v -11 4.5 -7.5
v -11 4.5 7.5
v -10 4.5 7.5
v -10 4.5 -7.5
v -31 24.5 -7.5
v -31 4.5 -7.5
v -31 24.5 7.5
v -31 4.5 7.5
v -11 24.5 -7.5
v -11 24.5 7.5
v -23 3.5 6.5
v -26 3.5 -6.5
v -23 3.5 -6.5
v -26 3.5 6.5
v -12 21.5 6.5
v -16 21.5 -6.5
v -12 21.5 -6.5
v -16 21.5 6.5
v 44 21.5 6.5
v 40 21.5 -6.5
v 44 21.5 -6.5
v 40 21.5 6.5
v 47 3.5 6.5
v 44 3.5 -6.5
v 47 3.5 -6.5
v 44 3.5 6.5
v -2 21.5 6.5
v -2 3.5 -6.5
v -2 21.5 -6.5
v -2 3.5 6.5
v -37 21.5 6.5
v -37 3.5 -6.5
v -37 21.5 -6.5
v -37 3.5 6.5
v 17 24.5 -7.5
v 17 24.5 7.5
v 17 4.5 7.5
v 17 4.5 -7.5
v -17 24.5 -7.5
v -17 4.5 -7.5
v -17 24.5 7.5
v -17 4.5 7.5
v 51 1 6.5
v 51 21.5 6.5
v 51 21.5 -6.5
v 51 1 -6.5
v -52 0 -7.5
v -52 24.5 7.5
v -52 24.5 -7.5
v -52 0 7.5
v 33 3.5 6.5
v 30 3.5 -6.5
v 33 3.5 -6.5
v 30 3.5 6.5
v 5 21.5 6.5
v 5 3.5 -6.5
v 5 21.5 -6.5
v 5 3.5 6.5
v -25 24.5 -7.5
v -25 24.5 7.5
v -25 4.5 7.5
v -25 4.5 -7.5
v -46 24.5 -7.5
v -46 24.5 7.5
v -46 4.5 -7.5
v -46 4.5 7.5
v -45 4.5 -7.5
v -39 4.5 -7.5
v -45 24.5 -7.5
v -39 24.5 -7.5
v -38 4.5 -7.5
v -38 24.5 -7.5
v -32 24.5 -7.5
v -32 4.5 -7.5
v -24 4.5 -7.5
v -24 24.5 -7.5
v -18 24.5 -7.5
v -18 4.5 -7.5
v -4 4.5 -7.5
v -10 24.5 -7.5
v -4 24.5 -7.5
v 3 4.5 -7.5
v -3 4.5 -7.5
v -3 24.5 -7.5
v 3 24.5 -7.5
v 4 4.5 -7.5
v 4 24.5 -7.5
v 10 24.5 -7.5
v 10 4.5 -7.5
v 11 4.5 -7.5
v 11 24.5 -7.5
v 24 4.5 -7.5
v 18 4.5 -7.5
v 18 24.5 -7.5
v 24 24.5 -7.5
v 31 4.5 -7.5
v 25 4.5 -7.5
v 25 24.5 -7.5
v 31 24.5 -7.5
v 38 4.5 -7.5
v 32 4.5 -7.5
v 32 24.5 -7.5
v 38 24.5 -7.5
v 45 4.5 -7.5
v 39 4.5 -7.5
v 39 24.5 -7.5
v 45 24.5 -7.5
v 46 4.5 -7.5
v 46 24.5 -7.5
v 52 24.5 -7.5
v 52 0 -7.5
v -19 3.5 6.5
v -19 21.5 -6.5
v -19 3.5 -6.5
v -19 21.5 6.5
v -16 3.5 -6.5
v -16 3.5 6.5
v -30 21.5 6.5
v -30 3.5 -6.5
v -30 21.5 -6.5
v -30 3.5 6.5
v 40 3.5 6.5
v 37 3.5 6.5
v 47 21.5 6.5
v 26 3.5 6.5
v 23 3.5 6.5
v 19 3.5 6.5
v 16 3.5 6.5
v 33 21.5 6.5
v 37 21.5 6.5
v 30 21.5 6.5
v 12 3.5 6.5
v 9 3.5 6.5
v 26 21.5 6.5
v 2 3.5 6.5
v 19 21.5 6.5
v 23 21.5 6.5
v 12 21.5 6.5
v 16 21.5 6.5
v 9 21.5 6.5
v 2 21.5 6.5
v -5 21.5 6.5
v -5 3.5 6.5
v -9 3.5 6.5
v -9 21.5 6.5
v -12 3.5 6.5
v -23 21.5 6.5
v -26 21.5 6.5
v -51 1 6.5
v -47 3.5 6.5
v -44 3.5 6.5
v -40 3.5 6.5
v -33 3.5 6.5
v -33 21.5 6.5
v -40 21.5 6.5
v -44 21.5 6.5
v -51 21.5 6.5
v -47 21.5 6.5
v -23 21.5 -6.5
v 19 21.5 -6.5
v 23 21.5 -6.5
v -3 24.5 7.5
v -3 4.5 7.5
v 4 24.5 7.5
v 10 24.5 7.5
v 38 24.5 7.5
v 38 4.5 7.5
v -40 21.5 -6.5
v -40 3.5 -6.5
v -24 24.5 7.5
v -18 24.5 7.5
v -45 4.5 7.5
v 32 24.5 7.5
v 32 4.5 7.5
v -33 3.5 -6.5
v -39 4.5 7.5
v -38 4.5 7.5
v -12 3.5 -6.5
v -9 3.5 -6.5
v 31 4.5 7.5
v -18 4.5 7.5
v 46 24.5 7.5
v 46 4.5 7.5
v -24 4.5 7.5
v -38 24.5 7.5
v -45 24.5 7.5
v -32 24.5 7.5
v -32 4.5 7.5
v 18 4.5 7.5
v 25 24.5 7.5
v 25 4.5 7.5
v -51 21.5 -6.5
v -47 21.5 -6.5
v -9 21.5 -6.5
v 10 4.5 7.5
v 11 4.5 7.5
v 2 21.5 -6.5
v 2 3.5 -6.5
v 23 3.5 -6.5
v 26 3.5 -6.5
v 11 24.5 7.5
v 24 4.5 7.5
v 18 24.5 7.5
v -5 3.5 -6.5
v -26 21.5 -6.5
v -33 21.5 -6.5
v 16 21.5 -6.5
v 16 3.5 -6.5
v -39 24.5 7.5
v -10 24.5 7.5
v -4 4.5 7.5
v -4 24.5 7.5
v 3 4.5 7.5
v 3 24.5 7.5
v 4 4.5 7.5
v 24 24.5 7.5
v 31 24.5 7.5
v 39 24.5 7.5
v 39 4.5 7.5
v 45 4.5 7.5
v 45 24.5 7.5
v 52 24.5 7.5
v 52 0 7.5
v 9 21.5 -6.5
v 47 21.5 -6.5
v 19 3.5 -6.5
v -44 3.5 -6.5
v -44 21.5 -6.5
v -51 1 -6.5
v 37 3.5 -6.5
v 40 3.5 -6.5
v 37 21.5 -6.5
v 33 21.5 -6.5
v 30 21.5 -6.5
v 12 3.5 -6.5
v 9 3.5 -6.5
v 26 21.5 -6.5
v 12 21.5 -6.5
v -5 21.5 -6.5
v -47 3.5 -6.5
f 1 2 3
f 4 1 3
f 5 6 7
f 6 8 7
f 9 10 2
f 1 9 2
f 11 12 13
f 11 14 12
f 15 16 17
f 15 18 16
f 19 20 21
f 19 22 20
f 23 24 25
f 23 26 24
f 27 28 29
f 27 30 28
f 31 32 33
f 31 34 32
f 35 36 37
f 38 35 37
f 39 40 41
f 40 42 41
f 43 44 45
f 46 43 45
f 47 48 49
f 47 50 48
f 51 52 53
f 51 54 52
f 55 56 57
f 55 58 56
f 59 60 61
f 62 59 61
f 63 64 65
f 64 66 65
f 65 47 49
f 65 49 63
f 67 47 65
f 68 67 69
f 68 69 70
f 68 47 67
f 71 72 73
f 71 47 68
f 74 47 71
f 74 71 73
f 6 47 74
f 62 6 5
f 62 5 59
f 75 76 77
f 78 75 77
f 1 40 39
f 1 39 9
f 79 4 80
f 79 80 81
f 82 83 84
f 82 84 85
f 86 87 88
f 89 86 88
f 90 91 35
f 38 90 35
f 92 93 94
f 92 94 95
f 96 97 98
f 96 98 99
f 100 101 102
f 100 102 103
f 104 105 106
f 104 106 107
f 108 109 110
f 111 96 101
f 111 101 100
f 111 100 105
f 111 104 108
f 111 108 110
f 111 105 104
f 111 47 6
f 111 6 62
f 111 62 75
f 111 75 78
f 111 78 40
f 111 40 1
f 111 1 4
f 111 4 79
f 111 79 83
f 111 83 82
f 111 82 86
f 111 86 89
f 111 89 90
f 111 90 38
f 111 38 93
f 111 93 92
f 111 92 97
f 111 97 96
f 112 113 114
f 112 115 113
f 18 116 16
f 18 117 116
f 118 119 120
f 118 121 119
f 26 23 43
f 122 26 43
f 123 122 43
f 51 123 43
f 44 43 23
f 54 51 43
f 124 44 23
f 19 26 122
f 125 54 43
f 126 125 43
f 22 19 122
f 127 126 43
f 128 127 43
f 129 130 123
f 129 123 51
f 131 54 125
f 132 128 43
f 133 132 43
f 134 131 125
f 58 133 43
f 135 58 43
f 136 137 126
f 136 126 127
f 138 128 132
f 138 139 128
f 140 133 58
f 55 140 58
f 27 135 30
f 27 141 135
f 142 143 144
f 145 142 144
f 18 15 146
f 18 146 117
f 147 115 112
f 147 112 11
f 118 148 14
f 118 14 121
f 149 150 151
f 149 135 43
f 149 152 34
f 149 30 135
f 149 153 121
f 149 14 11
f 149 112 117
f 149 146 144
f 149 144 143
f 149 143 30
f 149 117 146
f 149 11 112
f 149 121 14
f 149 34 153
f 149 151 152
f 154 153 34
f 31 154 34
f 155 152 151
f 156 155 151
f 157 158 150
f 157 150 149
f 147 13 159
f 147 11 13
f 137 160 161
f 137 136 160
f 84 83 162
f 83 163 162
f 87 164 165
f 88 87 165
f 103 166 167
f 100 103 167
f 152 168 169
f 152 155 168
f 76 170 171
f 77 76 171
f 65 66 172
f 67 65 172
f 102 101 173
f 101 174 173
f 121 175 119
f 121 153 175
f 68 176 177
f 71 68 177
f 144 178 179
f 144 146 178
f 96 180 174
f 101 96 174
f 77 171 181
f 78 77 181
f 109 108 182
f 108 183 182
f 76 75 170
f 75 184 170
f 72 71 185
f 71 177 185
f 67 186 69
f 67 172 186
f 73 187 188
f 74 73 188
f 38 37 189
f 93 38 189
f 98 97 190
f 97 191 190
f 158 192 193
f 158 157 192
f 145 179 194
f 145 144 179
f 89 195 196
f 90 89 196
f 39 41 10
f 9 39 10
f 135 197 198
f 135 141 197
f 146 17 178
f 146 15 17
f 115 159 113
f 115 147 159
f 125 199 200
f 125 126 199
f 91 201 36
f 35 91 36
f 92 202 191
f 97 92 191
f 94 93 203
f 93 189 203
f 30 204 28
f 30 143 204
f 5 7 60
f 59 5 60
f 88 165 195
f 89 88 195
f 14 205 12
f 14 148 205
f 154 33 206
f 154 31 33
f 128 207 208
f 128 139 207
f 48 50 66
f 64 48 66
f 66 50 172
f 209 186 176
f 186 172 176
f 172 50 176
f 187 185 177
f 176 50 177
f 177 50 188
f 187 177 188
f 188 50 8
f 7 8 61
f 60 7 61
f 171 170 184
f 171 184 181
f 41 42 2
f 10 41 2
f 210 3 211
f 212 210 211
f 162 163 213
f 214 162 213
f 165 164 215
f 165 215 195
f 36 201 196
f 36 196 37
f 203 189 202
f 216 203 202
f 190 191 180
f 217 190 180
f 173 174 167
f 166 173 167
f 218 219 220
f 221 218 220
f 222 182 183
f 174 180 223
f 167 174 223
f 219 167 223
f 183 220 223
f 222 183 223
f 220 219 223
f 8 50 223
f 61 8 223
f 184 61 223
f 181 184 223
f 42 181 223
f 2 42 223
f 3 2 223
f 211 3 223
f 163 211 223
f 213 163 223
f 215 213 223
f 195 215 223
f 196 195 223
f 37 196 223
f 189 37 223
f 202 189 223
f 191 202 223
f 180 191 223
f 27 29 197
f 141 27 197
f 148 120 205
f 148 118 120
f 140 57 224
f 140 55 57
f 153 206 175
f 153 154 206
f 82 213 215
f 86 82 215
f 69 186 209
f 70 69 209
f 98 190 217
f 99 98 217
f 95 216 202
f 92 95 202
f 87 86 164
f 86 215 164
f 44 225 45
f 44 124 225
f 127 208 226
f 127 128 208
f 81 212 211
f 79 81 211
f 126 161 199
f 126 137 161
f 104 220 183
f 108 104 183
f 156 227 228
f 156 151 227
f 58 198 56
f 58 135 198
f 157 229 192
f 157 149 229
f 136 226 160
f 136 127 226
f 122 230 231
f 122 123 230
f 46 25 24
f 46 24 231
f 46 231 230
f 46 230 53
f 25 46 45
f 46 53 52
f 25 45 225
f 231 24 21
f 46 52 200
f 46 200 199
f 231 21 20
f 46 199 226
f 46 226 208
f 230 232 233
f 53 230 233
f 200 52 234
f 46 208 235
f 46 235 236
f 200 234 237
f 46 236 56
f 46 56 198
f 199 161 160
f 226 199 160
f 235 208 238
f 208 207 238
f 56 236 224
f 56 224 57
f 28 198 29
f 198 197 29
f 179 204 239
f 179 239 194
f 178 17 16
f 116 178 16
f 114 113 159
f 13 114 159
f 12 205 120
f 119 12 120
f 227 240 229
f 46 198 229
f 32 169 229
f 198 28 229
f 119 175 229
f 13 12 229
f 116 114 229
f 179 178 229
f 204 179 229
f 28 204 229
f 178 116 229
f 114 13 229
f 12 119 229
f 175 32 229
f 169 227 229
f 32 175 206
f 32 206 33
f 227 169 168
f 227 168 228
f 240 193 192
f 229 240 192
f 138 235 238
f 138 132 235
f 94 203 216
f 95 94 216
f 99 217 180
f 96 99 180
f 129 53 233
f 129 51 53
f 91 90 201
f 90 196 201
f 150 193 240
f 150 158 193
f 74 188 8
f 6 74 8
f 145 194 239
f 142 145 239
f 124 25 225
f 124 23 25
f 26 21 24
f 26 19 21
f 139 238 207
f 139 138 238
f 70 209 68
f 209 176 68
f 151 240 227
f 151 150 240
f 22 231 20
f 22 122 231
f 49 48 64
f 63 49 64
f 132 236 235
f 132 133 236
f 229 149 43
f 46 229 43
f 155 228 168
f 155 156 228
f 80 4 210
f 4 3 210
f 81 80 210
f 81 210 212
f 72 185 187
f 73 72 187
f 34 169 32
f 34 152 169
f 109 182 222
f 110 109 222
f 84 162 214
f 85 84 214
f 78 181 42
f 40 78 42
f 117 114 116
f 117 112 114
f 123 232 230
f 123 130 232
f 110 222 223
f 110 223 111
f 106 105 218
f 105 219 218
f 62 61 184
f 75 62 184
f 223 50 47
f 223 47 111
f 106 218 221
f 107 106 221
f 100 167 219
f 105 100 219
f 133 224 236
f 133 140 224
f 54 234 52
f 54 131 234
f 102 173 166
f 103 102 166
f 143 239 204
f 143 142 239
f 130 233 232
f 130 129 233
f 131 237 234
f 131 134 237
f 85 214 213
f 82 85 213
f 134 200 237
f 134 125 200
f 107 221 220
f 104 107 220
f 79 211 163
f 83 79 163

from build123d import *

# Parameters (mm, degrees)
BOSS_EXTRUDE1_DEPTH     = 7.5
LPATTERN1_COUNT         = 8
LPATTERN1_PITCH         = 7
LPATTERN1_COL_COUNT     = 8
LPATTERN1_COL_PITCH     = 7
SHELL2_T                = -1
SKETCH3_W               = 0.5
SKETCH3_H               = 4.5
CUT_EXTRUDE2_DEPTH      = 15
CUT_EXTRUDE2_DEPTH_BACK = 8.5
SKETCH4_W               = 13
SKETCH4_H               = 2.5
BOSS_EXTRUDE2_DEPTH     = 1
SKETCH5_W               = 13
SKETCH5_H               = 2.5
BOSS_EXTRUDE3_DEPTH     = 1
SKETCH8_W               = 6
SKETCH8_H               = 15
BOSS_EXTRUDE5_DEPTH     = 2
LPATTERN2_COUNT         = 15
LPATTERN2_PITCH         = 7


with BuildPart() as part:
    # Sketch1 → Boss-Extrude1 (new body, symmetric)
    with BuildSketch(Plane.XY):
        Polygon((0, 0), (-3.5, 0), (-3.5, 4.5), (-3, 4.5), (-3, 22.5), (3, 22.5), (3, 4.5), (3.5, 4.5), (3.5, 0), align=None)
    boss_extrude1 = extrude(amount=BOSS_EXTRUDE1_DEPTH, both=True)

    # LPattern1: Boss-Extrude1 ×8
    with Locations(*[(i * LPATTERN1_PITCH, 0, 0) for i in range(1, LPATTERN1_COUNT)]):
        add(boss_extrude1)

    # LPattern1 col: Boss-Extrude1 ×8
    with Locations(*[(-i * LPATTERN1_COL_PITCH, 0, 0) for i in range(1, LPATTERN1_COL_COUNT)]):
        add(boss_extrude1)

    # Shell2
    shell2_openings = [part.faces().sort_by_distance(p)[0] for p in [
        (52.5, 2.25, 0),
        (-52.5, 2.25, 0),
    ]]
    offset(amount=SHELL2_T, openings=shell2_openings, kind=Kind.INTERSECTION)

    # Sketch3 → Cut-Extrude2 (cut, two sides)
    with BuildSketch(Plane.XY) as cut_extrude2_sk:
        with Locations((-52.25, 2.25)):
            Rectangle(SKETCH3_W, SKETCH3_H)
        with Locations((52.25, 2.25)):
            Rectangle(SKETCH3_W, SKETCH3_H)
    extrude(amount=CUT_EXTRUDE2_DEPTH, mode=Mode.SUBTRACT)
    extrude(cut_extrude2_sk.sketch, amount=-CUT_EXTRUDE2_DEPTH_BACK, mode=Mode.SUBTRACT)

    # Sketch4 → Boss-Extrude2 (add)
    with BuildSketch(Plane.ZY.offset(52)):
        with Locations((0, 2.25)):
            Rectangle(SKETCH4_W, SKETCH4_H)
    extrude(amount=-BOSS_EXTRUDE2_DEPTH)

    # Sketch5 → Boss-Extrude3 (add)
    with BuildSketch(Plane(origin=(52, 0, 0), x_dir=(0, 0, -1), z_dir=(1, 0, 0))):
        with Locations((0, 2.25)):
            Rectangle(SKETCH5_W, SKETCH5_H)
    extrude(amount=-BOSS_EXTRUDE3_DEPTH)

    # Sketch8 → Boss-Extrude5 (add)
    with BuildSketch(Plane(origin=(0, 22.5, 0), x_dir=(1, 0, 0), z_dir=(0, 1, 0))):
        with Locations((-49, 0)):
            Rectangle(SKETCH8_W, SKETCH8_H)
    boss_extrude5 = extrude(amount=BOSS_EXTRUDE5_DEPTH)

    # LPattern2: Boss-Extrude5 ×15
    with Locations(*[(i * LPATTERN2_PITCH, 0, 0) for i in range(1, LPATTERN2_COUNT)]):
        add(boss_extrude5)


solid = part.part
